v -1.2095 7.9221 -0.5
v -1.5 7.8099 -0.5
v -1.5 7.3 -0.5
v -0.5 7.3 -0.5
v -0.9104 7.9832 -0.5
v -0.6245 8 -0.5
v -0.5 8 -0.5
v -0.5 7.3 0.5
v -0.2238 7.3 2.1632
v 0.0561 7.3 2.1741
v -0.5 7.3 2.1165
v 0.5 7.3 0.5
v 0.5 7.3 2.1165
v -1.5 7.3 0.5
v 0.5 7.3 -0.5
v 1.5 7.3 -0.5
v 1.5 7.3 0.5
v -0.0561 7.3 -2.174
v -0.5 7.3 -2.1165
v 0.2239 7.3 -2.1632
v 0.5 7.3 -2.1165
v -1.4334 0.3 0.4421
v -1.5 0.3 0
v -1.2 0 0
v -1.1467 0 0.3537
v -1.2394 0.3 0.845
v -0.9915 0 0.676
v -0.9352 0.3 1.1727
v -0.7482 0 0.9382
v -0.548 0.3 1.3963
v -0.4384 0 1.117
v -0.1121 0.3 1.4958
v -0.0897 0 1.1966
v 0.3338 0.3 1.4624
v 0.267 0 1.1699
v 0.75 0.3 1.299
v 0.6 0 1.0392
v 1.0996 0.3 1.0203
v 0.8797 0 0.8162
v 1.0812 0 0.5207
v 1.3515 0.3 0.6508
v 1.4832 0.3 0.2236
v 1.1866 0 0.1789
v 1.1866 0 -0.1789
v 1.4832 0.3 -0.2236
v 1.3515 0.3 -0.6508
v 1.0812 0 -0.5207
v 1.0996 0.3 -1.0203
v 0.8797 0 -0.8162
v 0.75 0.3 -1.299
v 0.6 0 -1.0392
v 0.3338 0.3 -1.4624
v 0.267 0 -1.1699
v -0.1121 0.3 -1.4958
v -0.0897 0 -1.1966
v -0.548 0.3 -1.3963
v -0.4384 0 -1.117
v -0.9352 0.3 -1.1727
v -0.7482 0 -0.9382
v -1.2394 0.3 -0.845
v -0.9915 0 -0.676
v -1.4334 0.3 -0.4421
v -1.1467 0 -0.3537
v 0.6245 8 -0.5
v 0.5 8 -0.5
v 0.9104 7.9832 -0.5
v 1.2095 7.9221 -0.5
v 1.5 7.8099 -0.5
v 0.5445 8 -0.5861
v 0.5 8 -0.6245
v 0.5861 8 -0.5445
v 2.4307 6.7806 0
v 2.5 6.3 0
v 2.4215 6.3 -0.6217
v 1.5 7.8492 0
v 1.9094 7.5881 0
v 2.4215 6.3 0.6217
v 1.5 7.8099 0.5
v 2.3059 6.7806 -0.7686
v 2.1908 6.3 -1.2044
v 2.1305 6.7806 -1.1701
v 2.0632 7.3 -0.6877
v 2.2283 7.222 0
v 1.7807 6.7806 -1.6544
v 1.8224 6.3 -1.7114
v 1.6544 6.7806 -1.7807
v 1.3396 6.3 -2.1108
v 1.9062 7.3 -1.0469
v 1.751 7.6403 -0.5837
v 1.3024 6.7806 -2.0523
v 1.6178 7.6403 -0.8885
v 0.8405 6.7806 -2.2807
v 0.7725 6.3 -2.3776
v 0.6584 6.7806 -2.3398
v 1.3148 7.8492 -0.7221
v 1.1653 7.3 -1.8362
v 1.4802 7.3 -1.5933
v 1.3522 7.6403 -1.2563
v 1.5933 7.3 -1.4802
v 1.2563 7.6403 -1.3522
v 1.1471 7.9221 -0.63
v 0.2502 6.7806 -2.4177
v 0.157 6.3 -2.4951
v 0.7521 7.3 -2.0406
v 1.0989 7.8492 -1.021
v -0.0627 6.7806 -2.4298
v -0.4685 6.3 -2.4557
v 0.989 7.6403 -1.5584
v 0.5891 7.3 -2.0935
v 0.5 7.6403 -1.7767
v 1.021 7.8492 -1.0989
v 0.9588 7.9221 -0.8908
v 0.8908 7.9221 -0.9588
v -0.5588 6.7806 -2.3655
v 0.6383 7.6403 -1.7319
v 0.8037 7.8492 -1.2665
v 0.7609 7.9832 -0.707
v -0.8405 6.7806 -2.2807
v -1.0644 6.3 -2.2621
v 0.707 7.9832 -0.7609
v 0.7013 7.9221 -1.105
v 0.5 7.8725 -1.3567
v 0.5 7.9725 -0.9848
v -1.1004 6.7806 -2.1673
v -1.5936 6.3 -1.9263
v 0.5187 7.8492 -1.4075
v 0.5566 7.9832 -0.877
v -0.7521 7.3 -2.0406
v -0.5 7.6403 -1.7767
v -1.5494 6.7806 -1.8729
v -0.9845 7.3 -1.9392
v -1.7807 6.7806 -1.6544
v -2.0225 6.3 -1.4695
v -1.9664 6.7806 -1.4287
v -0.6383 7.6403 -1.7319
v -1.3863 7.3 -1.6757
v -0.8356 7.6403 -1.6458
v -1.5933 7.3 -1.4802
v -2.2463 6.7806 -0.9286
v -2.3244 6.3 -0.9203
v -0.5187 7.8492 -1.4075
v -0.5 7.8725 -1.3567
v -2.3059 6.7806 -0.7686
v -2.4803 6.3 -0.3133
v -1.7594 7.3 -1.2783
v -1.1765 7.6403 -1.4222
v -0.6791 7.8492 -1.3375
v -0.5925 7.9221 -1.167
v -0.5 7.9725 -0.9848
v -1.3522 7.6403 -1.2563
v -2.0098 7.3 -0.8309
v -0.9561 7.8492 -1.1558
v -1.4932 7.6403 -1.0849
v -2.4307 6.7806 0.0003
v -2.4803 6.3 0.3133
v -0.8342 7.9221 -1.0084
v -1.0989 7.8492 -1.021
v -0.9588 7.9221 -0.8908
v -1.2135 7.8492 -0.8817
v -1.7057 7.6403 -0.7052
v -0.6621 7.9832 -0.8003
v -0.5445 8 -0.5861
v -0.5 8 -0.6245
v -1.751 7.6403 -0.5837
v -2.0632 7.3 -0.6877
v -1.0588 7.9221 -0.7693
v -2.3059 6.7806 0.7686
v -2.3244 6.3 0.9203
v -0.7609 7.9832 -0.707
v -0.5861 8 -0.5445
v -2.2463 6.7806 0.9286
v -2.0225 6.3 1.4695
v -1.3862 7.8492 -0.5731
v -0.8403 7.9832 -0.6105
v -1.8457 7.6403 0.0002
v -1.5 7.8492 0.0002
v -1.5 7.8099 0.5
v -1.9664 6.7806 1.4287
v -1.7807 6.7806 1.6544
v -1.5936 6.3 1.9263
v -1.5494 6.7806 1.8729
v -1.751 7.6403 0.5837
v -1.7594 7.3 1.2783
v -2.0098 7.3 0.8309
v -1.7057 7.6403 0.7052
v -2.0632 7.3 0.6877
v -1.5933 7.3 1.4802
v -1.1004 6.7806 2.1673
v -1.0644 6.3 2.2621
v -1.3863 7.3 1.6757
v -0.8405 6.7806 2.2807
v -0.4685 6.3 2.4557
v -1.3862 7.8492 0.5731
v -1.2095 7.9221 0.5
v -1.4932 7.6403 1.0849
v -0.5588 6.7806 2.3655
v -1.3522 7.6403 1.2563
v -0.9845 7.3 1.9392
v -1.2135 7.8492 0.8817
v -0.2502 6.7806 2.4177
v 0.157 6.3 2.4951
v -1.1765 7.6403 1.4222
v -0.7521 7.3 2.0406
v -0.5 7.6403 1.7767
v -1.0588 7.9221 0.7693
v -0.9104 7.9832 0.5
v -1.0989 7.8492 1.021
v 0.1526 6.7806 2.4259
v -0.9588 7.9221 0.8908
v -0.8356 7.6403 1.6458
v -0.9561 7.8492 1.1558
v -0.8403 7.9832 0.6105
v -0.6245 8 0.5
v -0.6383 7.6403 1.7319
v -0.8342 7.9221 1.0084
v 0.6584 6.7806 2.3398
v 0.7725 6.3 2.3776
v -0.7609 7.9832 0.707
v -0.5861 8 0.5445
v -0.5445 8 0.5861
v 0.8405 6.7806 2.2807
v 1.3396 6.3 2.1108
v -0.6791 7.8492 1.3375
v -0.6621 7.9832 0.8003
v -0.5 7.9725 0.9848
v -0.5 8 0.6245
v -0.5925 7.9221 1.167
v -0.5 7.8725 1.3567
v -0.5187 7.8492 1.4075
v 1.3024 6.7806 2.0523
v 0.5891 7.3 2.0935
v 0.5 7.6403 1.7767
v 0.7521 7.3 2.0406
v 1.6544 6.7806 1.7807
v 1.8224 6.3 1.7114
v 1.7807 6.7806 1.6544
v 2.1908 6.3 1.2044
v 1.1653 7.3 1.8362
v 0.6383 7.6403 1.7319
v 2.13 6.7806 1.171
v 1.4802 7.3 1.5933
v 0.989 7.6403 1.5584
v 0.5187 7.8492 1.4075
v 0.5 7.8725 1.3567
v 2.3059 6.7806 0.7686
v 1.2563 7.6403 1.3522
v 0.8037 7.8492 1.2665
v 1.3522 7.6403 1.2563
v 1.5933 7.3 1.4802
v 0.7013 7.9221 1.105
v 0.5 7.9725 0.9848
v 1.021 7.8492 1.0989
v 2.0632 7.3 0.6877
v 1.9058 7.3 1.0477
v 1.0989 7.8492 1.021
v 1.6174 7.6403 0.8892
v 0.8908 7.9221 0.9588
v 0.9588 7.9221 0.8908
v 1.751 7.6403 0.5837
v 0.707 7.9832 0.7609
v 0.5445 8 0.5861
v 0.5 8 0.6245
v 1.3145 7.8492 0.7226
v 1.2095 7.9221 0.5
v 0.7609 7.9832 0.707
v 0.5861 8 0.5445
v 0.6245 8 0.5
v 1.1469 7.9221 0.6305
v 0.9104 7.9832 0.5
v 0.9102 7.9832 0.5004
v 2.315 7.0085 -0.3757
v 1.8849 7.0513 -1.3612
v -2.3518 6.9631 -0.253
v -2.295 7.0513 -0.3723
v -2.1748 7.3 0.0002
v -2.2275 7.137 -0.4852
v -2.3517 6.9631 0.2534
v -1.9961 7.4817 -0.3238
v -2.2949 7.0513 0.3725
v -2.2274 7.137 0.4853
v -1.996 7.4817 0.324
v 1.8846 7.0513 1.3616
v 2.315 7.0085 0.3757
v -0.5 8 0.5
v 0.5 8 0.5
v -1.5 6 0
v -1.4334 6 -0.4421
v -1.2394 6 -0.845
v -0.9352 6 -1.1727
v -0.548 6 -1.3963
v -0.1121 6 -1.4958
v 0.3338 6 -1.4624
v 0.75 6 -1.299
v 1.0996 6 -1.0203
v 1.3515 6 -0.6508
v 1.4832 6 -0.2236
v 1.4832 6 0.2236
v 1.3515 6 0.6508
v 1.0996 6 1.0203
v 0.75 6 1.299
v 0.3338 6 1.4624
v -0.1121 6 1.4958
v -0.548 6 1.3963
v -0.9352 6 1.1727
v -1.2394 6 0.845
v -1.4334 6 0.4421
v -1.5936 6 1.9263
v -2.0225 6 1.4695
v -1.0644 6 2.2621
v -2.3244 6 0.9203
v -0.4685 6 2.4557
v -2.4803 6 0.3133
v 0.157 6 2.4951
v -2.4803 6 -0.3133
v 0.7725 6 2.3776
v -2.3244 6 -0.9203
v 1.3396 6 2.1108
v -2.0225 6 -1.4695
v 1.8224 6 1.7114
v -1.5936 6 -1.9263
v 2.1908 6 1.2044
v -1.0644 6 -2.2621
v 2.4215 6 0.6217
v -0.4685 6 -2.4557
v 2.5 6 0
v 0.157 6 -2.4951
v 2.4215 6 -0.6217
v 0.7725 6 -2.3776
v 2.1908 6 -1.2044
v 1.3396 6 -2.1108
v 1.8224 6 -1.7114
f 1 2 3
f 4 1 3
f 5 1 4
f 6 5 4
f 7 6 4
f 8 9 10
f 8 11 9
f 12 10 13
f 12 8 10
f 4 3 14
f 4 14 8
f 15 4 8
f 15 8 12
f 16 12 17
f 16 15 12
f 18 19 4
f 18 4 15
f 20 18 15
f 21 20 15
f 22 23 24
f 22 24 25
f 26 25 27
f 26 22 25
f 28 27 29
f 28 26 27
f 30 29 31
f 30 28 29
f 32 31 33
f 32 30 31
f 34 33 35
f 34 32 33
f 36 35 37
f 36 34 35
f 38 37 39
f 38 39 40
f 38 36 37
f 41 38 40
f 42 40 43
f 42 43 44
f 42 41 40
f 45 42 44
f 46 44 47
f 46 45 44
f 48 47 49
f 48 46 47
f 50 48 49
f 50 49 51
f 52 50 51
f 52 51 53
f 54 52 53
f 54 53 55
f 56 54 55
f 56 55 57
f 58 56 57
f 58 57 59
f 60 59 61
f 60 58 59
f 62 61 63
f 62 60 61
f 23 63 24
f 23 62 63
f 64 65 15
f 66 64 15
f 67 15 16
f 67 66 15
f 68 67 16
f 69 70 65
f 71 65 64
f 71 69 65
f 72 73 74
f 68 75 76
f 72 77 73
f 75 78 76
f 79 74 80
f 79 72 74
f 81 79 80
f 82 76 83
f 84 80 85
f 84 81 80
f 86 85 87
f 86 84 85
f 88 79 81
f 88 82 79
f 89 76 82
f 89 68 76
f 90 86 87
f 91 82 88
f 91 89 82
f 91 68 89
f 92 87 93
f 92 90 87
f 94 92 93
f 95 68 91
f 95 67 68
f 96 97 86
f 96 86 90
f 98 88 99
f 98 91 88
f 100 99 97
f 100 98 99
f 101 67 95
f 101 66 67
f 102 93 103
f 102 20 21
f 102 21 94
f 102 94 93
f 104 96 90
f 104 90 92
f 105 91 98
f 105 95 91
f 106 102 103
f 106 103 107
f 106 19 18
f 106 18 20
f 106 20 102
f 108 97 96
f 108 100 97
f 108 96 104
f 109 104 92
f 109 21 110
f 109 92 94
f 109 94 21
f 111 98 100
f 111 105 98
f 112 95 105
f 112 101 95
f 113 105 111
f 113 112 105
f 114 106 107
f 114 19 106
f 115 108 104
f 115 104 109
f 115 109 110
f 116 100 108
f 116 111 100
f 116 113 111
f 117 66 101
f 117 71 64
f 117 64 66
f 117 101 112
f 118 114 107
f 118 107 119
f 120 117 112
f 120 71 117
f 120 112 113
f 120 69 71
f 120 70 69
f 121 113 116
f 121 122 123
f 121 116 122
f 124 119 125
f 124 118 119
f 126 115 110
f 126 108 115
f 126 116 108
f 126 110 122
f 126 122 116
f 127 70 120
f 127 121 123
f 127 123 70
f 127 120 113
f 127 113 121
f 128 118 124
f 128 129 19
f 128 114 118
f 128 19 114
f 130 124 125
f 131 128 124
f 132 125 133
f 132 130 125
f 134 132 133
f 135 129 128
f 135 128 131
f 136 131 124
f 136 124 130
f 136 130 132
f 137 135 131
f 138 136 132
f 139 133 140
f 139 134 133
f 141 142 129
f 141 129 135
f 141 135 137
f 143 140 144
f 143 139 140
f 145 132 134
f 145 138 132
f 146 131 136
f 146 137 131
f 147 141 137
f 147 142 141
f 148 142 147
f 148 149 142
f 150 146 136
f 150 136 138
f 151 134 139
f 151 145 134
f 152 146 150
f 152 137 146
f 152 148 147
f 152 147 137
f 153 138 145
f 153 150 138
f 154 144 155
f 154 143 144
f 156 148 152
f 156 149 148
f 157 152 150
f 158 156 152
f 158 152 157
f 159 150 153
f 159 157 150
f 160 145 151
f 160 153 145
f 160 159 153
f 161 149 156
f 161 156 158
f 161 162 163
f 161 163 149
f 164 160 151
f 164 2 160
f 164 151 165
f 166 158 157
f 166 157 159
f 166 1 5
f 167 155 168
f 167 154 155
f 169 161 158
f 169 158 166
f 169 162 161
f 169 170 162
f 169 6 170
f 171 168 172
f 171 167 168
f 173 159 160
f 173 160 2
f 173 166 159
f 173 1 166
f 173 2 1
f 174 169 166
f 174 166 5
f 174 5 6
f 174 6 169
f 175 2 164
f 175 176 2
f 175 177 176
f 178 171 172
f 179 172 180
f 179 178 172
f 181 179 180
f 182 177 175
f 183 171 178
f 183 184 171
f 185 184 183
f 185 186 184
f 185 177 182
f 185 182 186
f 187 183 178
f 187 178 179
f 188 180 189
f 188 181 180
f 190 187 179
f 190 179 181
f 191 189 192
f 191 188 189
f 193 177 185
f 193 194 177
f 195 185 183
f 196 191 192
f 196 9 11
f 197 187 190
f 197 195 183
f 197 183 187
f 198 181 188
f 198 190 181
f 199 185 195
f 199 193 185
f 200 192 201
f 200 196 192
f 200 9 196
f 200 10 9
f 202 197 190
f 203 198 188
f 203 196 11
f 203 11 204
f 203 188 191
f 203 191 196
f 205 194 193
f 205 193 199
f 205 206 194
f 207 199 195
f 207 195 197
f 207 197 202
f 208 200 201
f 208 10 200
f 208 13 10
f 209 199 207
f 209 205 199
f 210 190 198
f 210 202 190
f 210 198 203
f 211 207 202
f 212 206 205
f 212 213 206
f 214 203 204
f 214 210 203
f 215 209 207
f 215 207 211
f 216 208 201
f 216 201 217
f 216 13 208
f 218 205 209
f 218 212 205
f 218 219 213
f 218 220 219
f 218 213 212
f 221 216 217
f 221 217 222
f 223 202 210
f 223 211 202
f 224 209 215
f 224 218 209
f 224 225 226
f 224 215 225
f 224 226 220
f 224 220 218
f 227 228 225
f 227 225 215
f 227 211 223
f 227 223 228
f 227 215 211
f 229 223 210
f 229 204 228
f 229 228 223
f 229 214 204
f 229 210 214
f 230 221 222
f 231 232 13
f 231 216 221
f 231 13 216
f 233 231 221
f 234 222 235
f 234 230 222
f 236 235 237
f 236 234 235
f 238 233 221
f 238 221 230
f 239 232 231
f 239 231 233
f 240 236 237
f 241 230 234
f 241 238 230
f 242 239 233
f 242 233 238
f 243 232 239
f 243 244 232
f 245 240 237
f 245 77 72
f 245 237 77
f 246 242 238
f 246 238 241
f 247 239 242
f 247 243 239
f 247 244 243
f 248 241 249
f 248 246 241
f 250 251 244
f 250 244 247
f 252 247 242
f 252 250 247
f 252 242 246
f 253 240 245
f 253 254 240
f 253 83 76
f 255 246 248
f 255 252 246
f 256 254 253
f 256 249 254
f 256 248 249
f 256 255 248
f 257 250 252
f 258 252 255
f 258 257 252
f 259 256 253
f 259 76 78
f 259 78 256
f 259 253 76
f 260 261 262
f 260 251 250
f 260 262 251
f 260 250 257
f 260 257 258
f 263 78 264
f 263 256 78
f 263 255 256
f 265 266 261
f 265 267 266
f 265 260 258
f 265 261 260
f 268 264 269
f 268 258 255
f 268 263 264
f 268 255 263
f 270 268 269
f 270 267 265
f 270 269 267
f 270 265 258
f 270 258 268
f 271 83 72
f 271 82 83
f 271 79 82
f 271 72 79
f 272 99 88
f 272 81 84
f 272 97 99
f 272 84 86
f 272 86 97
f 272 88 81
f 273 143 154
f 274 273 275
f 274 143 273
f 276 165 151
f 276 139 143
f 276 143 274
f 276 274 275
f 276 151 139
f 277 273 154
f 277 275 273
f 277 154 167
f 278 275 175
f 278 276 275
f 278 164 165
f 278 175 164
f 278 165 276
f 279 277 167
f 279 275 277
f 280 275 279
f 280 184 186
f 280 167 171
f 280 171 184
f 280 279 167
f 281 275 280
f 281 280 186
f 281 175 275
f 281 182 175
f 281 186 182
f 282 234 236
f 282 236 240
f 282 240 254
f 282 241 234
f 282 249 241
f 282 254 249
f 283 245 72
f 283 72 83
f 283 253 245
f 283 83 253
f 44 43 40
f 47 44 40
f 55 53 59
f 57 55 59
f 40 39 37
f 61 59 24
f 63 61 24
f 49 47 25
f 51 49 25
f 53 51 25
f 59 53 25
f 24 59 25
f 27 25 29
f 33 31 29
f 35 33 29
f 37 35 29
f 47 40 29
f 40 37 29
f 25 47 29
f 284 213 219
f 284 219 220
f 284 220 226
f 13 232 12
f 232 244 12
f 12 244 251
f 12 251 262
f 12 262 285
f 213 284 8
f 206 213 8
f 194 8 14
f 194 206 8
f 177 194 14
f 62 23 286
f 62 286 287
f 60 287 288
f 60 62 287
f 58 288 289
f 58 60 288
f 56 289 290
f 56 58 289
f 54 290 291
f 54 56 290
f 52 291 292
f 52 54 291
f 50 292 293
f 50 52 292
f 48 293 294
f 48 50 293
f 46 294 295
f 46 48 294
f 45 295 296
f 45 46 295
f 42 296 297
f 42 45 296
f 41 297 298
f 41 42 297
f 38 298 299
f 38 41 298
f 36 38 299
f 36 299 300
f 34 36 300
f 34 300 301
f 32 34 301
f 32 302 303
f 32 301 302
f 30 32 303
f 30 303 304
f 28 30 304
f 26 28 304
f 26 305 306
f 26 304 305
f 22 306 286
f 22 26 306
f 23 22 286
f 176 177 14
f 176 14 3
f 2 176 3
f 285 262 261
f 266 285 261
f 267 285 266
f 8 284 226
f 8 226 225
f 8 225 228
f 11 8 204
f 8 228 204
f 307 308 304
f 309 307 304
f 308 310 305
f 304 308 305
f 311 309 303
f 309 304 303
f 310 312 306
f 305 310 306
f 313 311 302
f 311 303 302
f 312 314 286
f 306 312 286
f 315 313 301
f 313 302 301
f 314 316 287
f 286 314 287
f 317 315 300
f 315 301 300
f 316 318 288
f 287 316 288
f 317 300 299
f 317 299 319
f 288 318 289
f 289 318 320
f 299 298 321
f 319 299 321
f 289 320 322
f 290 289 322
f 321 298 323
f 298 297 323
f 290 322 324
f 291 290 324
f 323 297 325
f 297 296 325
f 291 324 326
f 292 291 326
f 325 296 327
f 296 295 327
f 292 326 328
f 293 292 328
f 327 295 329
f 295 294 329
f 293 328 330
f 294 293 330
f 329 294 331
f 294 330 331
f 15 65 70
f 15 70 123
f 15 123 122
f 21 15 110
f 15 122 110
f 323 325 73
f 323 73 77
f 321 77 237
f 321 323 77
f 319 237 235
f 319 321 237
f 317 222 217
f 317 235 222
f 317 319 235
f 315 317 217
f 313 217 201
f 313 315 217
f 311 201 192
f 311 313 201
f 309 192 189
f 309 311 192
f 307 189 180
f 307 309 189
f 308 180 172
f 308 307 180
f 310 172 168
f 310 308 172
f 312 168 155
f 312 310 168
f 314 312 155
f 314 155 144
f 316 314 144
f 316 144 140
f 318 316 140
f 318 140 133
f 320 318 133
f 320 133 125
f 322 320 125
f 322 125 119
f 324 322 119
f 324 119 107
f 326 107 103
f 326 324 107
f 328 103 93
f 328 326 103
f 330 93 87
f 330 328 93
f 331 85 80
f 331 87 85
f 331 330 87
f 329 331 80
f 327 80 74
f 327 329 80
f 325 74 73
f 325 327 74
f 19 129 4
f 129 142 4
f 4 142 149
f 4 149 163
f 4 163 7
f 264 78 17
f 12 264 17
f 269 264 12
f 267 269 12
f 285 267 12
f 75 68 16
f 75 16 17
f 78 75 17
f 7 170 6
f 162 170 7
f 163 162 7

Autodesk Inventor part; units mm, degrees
ref_plane "YZ Plane" through (0, 0, 0) normal (1, 0, 0) x (0, 1, 0)
ref_plane "XZ Plane" through (0, 0, 0) normal (0, 1, 0) x (-1, 0, 0)
ref_plane "XY Plane" through (0, 0, 0) normal (0, 0, 1) x (1, 0, 0)
sketch "Sketch1" plane through (0, 0, 0) normal (0, 1, 0) x (-1, 0, 0)
  circle A0 centre (0, 0) radius 1.5
  dimension "d0" = 3
extrude "Extrusion1" add sketch "Sketch1" along normal blind 6
sketch "Sketch2" plane through (0, 6, 0) normal (0, 1, 0) x (1, 0, 0)
  circle A0 centre (0, 0) radius 2.5
  dimension "d3" = 5
extrude "Extrusion2" add sketch "Sketch2" along normal blind 2
fillet "Fillet1" radius 1.7 1 edges at (-2.5, 8, 0)
chamfer "Chamfer1" distance 0.3 angle 45 1 edges at (1.5, 0, 0)
thread "Thread1" size "M3x0.5" class "6g" standard "ANSI Metric M Profile" full length
sketch "Sketch3" plane through (0, 8, 0) normal (0, 1, 0) x (1, 0, 0)
  line L0 (0.5, -2.5) -> (0.5, 2.5)
  line L1 (0.5, 2.5) -> (-0.5, 2.5)
  line L2 (-0.5, 2.5) -> (-0.5, -2.5)
  line L3 (-0.5, -2.5) -> (0.5, -2.5)
  line L4 (0.5, -2.5) -> (-0.5, 2.5) construction
  line L5 (0.5, 2.5) -> (-0.5, -2.5) construction
  line L6 (1.5, -0.5) -> (-1.5, -0.5)
  line L7 (-1.5, -0.5) -> (-1.5, 0.5)
  line L8 (-1.5, 0.5) -> (1.5, 0.5)
  line L9 (1.5, 0.5) -> (1.5, -0.5)
  circle A0 centre (0, 0) radius 2.5 projected
  line L10 (1.5, -0.5) -> (-1.5, 0.5) construction
  line L11 (-1.5, -0.5) -> (1.5, 0.5) construction
  dimension "d12" = 1
  dimension "d13" = 3
  dimension "d14" = 1
extrude "Extrusion3" cut sketch "Sketch3" against normal blind 0.7 contours L3 A0 L0 | A0 L2 L6 L0 | L3 L2 A0 | L6 L2 L8 L0 | L0 L8 L9 L6 | L8 L2 A0 L0 | L6 L7 L8 L2 | A0 L1 L0 | L2 L1 A0
properties part number "M3x10 Screw Nylon" material "Steel"
